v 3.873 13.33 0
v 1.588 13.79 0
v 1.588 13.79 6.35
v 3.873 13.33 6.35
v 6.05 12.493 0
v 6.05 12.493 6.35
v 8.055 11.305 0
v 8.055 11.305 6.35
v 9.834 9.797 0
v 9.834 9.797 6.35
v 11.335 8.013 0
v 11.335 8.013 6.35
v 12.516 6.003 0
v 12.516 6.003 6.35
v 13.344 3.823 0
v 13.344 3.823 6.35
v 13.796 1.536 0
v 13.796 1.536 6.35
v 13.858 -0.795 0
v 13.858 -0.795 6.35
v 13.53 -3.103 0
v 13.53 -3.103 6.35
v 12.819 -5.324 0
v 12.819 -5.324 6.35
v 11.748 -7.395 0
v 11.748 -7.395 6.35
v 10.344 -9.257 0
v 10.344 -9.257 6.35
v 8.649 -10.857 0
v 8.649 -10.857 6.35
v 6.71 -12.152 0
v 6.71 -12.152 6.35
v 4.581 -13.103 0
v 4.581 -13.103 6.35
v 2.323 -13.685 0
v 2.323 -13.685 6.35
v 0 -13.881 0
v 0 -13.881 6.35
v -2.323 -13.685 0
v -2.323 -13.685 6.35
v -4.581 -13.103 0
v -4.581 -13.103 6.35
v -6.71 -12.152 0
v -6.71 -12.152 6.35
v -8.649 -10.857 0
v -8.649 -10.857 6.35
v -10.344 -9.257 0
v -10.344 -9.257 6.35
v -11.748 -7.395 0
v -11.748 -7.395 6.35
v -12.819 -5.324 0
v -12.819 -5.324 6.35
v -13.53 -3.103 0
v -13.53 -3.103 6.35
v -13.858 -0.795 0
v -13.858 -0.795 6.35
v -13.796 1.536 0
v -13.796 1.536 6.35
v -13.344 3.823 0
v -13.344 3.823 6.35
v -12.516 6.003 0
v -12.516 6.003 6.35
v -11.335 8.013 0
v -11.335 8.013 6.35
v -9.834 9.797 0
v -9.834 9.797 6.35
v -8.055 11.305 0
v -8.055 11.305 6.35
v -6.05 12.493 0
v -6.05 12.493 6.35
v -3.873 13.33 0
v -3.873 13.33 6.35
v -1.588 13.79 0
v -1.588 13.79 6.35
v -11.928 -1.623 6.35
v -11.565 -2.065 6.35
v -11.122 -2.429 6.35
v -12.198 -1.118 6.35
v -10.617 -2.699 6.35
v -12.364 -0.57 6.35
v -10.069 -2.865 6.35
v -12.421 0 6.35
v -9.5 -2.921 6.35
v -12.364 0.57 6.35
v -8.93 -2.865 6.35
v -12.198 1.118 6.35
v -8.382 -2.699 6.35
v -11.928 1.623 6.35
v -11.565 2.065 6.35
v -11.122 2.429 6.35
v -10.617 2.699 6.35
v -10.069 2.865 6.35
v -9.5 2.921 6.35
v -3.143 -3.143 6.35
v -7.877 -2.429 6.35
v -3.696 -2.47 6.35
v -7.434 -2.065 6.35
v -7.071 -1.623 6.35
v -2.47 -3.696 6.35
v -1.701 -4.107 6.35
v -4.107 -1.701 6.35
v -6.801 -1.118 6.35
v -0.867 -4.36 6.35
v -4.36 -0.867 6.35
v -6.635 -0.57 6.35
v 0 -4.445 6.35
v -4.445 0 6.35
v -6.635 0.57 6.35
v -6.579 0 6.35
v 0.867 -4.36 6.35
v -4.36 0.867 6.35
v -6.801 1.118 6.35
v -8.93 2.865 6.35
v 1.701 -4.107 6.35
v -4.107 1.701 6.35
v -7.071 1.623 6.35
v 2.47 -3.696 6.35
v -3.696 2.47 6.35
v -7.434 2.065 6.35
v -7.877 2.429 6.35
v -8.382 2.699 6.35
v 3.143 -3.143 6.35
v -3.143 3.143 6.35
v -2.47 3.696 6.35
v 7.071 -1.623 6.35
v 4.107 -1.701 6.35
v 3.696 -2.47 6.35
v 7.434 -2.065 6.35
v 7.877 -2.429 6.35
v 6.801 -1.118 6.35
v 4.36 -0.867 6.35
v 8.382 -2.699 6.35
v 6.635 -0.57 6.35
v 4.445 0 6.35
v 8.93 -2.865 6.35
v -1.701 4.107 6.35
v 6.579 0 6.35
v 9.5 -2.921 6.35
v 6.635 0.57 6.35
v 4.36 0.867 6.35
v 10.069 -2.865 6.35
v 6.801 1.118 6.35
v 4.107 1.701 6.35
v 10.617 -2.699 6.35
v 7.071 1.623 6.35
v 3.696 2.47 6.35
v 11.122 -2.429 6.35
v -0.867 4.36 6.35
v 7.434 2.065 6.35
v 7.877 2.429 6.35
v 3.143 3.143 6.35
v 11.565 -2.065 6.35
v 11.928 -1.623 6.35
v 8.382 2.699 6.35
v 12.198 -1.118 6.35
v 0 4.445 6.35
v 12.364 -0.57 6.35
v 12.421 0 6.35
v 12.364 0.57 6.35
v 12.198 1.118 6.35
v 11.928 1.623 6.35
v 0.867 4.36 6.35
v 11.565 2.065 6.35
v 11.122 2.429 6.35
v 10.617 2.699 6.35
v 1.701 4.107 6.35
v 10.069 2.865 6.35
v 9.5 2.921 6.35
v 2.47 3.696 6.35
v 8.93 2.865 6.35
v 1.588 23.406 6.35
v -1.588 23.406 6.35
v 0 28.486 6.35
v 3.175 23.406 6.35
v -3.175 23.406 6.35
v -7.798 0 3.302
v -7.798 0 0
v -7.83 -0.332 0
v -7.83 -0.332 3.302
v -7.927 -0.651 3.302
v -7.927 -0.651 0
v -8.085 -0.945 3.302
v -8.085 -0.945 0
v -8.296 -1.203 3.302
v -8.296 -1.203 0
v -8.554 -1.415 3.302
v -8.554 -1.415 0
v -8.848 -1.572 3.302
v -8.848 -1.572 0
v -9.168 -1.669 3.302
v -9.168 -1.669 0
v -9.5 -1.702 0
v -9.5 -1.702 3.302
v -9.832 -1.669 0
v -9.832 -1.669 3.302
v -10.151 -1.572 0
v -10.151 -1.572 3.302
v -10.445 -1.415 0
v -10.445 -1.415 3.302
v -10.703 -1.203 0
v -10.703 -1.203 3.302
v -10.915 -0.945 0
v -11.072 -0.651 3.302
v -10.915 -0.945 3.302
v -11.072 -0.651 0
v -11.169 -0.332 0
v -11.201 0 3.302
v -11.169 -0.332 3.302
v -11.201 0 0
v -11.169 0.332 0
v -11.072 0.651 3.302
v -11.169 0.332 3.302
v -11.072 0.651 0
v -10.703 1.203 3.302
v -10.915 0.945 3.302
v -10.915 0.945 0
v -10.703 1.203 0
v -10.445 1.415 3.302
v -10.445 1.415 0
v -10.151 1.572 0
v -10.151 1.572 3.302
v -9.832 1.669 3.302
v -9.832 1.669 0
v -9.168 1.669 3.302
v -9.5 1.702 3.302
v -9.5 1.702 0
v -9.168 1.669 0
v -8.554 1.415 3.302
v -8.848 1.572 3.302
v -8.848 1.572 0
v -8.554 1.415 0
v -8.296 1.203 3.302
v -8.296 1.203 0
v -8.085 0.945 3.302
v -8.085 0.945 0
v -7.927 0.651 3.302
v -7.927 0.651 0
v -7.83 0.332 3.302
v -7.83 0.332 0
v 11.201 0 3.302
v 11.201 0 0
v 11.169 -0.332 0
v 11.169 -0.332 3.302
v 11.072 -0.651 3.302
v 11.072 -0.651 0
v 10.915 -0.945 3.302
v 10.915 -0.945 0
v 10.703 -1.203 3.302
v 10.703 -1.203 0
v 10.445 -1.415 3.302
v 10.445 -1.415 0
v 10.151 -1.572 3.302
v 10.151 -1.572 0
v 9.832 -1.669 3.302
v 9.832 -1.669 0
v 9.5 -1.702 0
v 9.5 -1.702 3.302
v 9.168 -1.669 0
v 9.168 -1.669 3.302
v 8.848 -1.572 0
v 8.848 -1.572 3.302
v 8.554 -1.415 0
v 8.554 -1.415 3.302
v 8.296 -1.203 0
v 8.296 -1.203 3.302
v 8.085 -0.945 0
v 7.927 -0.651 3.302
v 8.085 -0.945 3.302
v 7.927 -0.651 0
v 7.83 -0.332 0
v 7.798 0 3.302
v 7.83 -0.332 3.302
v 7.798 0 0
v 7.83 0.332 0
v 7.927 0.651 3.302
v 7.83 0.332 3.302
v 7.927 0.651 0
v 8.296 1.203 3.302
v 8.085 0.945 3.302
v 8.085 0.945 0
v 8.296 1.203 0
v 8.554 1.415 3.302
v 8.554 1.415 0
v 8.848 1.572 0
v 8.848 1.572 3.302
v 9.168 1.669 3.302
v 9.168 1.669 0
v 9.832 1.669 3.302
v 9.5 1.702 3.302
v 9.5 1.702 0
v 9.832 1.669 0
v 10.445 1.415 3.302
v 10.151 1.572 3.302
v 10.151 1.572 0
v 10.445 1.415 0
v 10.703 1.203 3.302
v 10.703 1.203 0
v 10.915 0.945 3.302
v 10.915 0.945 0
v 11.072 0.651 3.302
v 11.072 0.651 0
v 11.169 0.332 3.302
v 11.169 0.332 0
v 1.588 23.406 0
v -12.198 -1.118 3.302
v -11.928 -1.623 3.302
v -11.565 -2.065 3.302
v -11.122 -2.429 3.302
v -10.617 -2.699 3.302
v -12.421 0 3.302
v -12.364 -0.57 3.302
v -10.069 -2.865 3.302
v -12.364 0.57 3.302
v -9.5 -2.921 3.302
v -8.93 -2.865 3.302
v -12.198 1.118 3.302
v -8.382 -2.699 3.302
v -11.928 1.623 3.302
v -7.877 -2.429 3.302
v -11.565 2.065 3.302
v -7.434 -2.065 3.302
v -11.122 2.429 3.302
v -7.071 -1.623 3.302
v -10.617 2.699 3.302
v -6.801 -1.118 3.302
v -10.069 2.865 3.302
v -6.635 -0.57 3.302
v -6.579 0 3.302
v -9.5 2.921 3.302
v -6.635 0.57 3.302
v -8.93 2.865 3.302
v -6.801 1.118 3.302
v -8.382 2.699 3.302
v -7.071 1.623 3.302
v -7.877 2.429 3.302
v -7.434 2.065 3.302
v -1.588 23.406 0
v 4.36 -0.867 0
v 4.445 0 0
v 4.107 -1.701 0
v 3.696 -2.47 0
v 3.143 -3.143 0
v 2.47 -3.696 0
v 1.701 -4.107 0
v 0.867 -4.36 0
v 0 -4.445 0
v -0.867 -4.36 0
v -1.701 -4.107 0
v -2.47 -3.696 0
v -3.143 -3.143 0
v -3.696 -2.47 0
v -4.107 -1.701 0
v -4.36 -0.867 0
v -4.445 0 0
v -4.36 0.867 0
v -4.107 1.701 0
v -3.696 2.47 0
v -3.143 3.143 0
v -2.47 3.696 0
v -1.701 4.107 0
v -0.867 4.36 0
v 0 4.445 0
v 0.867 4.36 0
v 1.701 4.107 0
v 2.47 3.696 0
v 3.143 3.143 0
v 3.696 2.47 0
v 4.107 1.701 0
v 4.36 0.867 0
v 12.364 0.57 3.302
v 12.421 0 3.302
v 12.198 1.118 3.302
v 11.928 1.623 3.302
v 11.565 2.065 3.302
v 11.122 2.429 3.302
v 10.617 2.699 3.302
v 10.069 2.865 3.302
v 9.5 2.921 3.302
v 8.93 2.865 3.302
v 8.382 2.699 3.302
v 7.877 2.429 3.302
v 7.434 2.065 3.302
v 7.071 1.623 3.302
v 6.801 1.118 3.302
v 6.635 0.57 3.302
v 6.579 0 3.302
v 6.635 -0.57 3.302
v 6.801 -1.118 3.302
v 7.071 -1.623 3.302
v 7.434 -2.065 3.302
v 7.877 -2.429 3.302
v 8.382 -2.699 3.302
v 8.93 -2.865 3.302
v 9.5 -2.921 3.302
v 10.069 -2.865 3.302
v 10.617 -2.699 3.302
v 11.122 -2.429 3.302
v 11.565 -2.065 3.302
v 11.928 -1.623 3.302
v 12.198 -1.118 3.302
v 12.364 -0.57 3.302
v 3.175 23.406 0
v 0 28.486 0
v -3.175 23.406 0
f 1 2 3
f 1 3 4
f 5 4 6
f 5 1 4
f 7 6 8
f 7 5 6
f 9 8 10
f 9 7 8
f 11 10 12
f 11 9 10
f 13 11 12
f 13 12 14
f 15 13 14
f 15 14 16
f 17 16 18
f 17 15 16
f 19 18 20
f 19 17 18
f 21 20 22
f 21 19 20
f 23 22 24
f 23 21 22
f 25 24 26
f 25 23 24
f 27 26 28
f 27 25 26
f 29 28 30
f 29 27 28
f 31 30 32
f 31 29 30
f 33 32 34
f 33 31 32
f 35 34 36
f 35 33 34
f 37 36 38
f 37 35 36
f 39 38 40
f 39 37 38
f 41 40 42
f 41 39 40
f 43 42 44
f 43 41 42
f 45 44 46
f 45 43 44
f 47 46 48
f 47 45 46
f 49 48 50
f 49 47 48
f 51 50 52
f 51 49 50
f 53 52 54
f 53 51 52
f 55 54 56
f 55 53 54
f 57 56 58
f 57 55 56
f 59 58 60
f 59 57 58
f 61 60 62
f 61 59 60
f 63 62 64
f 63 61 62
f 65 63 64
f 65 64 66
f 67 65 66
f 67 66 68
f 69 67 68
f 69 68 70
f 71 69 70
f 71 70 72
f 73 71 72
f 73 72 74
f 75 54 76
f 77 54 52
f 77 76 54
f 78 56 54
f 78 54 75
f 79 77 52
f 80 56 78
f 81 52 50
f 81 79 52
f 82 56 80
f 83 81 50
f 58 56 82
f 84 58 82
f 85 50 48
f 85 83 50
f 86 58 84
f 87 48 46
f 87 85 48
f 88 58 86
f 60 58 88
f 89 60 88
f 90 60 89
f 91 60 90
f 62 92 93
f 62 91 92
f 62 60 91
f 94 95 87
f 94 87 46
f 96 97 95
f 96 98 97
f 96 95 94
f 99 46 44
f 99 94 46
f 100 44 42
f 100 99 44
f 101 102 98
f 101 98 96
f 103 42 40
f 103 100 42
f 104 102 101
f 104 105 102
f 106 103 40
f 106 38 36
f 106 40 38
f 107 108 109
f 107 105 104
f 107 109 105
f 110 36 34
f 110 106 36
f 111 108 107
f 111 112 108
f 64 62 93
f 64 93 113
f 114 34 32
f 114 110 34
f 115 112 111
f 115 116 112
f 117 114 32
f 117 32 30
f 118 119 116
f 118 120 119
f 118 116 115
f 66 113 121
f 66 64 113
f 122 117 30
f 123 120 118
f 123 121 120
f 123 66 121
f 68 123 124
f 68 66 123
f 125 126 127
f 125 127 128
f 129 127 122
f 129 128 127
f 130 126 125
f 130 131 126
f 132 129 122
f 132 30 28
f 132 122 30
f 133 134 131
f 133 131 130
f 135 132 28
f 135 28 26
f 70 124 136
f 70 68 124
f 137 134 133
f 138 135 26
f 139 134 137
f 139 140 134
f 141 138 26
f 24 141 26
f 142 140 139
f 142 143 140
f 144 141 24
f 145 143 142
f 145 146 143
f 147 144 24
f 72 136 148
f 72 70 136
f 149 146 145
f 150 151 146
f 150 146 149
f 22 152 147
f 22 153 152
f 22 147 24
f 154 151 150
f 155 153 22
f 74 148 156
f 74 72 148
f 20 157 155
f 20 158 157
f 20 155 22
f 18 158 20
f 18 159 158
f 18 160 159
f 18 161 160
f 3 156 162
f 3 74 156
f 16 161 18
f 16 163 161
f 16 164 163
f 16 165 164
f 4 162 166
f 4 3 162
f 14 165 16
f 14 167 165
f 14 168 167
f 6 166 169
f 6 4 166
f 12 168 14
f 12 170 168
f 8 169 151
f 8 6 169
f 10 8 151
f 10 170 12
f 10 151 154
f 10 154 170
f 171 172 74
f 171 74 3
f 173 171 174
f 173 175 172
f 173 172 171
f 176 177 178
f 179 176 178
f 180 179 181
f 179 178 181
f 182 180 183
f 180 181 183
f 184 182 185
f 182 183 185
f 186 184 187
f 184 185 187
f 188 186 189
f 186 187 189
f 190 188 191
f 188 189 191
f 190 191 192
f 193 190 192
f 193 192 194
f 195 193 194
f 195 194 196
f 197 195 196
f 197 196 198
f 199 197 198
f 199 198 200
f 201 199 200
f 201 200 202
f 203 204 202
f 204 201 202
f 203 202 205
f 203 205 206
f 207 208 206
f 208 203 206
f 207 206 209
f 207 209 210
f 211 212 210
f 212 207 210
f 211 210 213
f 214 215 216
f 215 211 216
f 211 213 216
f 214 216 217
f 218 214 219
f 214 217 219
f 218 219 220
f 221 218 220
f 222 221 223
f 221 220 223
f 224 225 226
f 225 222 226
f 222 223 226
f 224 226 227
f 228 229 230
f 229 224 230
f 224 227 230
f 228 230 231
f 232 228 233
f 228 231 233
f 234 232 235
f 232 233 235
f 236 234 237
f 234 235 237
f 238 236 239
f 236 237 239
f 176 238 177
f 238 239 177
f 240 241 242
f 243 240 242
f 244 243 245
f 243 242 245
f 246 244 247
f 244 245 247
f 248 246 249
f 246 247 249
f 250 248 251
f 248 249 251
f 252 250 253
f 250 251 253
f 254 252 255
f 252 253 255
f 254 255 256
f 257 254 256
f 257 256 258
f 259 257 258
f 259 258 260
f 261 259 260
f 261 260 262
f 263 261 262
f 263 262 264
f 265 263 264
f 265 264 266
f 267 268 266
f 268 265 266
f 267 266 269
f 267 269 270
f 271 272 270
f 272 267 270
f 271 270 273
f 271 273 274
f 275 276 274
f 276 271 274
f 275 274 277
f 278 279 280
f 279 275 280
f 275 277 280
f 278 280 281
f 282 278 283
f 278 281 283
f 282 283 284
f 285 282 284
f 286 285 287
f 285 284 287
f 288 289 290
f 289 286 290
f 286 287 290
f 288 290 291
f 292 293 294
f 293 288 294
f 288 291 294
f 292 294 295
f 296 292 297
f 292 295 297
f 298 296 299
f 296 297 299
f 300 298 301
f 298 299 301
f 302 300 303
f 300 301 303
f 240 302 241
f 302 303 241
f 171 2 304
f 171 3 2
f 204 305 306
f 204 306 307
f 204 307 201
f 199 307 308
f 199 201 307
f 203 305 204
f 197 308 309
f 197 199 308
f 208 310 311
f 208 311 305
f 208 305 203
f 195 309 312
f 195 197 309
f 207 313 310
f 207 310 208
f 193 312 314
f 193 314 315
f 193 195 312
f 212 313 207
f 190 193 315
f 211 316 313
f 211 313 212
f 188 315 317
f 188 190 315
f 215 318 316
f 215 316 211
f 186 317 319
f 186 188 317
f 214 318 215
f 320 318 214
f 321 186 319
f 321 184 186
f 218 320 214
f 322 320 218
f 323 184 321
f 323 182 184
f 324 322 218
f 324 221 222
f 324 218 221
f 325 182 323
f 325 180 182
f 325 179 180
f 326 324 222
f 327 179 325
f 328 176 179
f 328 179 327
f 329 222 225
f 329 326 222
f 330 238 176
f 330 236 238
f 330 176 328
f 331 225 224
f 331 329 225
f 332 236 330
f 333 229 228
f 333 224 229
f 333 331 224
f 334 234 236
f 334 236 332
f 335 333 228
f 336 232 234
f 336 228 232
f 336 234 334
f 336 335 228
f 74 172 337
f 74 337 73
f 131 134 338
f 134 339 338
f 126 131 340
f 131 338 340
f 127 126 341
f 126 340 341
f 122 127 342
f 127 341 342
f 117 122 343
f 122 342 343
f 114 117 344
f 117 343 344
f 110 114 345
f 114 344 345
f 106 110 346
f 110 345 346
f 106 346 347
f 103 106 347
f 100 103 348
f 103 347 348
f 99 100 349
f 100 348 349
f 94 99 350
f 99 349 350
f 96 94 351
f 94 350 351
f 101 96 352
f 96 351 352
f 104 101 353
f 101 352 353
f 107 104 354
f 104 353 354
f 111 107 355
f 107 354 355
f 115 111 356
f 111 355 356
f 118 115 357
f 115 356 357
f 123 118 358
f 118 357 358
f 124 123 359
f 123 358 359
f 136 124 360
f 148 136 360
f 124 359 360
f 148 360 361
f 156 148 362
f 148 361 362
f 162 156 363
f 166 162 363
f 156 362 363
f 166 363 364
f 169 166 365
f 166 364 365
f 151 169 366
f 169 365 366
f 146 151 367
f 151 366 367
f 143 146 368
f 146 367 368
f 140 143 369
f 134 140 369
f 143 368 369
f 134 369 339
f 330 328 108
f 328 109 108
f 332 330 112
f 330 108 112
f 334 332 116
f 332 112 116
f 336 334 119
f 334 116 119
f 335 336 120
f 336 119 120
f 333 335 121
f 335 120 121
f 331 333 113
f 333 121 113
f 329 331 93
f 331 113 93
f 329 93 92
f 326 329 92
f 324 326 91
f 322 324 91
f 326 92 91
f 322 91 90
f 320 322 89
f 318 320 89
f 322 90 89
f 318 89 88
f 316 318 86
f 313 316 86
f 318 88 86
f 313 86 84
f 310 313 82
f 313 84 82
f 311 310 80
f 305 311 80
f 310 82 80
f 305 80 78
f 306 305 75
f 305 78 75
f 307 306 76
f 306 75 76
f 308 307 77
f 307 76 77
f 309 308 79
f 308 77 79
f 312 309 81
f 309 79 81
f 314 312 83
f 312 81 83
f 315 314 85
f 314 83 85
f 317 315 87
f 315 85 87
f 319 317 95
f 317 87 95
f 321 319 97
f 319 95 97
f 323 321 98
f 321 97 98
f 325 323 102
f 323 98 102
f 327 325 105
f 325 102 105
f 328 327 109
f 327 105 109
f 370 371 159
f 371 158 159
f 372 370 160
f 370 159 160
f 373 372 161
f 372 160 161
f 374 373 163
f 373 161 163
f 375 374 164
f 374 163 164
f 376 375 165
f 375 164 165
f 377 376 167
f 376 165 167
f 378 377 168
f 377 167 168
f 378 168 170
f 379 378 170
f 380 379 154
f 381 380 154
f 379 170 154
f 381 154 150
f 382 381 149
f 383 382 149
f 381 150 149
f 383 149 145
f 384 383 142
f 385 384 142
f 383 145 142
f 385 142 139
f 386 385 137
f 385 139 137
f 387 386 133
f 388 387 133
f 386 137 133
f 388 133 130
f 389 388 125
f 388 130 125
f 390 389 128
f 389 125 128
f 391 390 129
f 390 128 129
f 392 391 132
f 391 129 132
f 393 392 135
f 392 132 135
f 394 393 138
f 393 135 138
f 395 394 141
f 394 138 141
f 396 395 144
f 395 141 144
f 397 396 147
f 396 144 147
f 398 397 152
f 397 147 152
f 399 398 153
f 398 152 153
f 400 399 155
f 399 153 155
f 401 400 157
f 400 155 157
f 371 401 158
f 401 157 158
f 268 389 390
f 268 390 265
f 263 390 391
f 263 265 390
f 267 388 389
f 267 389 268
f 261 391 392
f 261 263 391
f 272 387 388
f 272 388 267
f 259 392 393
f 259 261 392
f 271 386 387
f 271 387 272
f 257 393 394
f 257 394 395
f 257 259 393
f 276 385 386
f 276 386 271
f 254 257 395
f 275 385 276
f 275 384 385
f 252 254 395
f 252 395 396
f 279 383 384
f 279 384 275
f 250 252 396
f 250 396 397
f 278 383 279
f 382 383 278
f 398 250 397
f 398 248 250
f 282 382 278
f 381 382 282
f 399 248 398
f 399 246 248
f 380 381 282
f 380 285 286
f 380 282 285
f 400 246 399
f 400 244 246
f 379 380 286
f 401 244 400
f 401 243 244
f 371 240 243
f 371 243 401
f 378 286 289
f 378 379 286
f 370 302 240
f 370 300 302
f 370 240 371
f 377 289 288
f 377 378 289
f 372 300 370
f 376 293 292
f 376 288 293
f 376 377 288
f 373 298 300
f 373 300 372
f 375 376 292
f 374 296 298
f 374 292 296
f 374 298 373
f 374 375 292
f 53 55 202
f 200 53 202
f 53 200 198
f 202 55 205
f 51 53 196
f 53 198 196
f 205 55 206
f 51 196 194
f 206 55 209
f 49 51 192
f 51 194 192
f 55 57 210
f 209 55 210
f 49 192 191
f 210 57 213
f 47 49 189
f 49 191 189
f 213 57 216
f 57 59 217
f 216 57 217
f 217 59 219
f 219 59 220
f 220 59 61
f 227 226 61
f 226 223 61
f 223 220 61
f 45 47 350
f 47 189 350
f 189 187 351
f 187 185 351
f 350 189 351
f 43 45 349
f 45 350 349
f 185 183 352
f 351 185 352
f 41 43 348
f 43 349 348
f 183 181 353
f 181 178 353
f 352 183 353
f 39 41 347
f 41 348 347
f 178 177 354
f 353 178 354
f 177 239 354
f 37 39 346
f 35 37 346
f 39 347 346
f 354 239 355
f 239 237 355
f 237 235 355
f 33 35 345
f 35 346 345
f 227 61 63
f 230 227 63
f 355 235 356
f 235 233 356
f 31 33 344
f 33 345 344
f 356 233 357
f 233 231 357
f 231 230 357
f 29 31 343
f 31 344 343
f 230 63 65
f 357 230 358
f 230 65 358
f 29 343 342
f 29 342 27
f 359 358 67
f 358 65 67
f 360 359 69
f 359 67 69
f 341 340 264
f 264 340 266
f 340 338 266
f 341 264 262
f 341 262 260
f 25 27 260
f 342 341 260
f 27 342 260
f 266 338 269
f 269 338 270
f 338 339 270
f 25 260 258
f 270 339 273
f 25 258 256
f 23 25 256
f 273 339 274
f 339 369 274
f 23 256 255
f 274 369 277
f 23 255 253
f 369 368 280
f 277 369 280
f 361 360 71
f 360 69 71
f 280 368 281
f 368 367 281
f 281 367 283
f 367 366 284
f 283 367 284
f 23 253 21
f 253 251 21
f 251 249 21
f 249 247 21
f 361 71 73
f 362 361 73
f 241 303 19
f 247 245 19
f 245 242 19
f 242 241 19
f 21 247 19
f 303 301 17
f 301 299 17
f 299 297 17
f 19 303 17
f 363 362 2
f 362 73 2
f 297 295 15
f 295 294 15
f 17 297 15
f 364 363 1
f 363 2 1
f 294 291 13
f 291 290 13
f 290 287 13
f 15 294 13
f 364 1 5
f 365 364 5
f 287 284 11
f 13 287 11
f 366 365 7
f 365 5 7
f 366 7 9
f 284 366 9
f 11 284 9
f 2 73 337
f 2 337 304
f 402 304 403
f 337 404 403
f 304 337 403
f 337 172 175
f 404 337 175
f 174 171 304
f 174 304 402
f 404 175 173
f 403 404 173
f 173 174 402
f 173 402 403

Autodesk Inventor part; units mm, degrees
ref_plane "YZ Plane" through (0, 0, 0) normal (1, 0, 0) x (0, 1, 0)
ref_plane "XZ Plane" through (0, 0, 0) normal (0, 1, 0) x (-1, 0, 0)
ref_plane "XY Plane" through (0, 0, 0) normal (0, 0, 1) x (1, 0, 0)
sketch "Sketch1" plane through (0, 0, 0) normal (0, 0, 1) x (1, 0, 0)
  circle A0 centre (0, 0) radius 13.8811
  circle A1 centre (0, 0) radius 4.445
  circle A2 centre (-9.4996, 0) radius 1.7018
  circle A3 centre (9.4996, 0) radius 1.7018
  dimension "d0" = 27.7622
  dimension "d1" = 8.89
  dimension "d2" = 18.9992
  dimension "d3" = 9.4996
  dimension "d4" = 3.4036
  dimension "d5" = 3.4036
extrude "Extrusion1" add sketch "Sketch1" along normal blind 6.35
sketch "Sketch2" plane through (0, 0, 6.35) normal (0, 0, 1) x (1, 0, 0)
  line L0 (-1.5875, 4.445) -> (1.5875, 4.445)
  line L1 (1.5875, 4.445) -> (1.5875, 23.4061)
  line L2 (1.5875, 23.4061) -> (-1.5875, 23.4061)
  line L3 (-1.5875, 23.4061) -> (-1.5875, 4.445)
  circle A0 centre (0, 0) radius 4.445 projected
  circle A1 centre (0, 0) radius 13.8811 projected
  line L4 (0, 23.4061) -> (-3.175, 23.4061)
  line L5 (-3.175, 23.4061) -> (0, 28.4861)
  line L6 (0, 23.4061) -> (0, 21.3049) construction
  line L7 (0, 23.4061) -> (3.175, 23.4061)
  line L8 (3.175, 23.4061) -> (0, 28.4861)
  point P0 (0, 4.445)
  dimension "d8" = 3.175
  dimension "d9" = 9.525
  dimension "d10" = 5.08
  dimension "d11" = 3.175
extrude "Extrusion2" add sketch "Sketch2" against normal up to surface (6.35 mm away) contours L3 A1 L1 L0 | L3 L2 L1 A1 | L4 L5 L8 L7 L2 picked at (-1.0583, 7.56)
sketch "Sketch3" plane through (0, 0, 6.35) normal (0, 0, 1) x (1, 0, 0)
  circle A0 centre (-9.4996, 0) radius 1.7018 projected
  circle A1 centre (-9.4996, 0) radius 2.921
  circle A2 centre (9.4996, 0) radius 1.7018 projected
  circle A3 centre (9.4996, 0) radius 2.921
  point P0 (0, 0)
  dimension "d14" = 5.842
  dimension "d15" = 5.842
extrude "Extrusion3" cut sketch "Sketch3" against normal blind 3.048
equation "\"d3\" = 0.5 * d2"
equation "\"d15\" = d14"
properties part number "Brushless_Motor_Base_Arrow"
